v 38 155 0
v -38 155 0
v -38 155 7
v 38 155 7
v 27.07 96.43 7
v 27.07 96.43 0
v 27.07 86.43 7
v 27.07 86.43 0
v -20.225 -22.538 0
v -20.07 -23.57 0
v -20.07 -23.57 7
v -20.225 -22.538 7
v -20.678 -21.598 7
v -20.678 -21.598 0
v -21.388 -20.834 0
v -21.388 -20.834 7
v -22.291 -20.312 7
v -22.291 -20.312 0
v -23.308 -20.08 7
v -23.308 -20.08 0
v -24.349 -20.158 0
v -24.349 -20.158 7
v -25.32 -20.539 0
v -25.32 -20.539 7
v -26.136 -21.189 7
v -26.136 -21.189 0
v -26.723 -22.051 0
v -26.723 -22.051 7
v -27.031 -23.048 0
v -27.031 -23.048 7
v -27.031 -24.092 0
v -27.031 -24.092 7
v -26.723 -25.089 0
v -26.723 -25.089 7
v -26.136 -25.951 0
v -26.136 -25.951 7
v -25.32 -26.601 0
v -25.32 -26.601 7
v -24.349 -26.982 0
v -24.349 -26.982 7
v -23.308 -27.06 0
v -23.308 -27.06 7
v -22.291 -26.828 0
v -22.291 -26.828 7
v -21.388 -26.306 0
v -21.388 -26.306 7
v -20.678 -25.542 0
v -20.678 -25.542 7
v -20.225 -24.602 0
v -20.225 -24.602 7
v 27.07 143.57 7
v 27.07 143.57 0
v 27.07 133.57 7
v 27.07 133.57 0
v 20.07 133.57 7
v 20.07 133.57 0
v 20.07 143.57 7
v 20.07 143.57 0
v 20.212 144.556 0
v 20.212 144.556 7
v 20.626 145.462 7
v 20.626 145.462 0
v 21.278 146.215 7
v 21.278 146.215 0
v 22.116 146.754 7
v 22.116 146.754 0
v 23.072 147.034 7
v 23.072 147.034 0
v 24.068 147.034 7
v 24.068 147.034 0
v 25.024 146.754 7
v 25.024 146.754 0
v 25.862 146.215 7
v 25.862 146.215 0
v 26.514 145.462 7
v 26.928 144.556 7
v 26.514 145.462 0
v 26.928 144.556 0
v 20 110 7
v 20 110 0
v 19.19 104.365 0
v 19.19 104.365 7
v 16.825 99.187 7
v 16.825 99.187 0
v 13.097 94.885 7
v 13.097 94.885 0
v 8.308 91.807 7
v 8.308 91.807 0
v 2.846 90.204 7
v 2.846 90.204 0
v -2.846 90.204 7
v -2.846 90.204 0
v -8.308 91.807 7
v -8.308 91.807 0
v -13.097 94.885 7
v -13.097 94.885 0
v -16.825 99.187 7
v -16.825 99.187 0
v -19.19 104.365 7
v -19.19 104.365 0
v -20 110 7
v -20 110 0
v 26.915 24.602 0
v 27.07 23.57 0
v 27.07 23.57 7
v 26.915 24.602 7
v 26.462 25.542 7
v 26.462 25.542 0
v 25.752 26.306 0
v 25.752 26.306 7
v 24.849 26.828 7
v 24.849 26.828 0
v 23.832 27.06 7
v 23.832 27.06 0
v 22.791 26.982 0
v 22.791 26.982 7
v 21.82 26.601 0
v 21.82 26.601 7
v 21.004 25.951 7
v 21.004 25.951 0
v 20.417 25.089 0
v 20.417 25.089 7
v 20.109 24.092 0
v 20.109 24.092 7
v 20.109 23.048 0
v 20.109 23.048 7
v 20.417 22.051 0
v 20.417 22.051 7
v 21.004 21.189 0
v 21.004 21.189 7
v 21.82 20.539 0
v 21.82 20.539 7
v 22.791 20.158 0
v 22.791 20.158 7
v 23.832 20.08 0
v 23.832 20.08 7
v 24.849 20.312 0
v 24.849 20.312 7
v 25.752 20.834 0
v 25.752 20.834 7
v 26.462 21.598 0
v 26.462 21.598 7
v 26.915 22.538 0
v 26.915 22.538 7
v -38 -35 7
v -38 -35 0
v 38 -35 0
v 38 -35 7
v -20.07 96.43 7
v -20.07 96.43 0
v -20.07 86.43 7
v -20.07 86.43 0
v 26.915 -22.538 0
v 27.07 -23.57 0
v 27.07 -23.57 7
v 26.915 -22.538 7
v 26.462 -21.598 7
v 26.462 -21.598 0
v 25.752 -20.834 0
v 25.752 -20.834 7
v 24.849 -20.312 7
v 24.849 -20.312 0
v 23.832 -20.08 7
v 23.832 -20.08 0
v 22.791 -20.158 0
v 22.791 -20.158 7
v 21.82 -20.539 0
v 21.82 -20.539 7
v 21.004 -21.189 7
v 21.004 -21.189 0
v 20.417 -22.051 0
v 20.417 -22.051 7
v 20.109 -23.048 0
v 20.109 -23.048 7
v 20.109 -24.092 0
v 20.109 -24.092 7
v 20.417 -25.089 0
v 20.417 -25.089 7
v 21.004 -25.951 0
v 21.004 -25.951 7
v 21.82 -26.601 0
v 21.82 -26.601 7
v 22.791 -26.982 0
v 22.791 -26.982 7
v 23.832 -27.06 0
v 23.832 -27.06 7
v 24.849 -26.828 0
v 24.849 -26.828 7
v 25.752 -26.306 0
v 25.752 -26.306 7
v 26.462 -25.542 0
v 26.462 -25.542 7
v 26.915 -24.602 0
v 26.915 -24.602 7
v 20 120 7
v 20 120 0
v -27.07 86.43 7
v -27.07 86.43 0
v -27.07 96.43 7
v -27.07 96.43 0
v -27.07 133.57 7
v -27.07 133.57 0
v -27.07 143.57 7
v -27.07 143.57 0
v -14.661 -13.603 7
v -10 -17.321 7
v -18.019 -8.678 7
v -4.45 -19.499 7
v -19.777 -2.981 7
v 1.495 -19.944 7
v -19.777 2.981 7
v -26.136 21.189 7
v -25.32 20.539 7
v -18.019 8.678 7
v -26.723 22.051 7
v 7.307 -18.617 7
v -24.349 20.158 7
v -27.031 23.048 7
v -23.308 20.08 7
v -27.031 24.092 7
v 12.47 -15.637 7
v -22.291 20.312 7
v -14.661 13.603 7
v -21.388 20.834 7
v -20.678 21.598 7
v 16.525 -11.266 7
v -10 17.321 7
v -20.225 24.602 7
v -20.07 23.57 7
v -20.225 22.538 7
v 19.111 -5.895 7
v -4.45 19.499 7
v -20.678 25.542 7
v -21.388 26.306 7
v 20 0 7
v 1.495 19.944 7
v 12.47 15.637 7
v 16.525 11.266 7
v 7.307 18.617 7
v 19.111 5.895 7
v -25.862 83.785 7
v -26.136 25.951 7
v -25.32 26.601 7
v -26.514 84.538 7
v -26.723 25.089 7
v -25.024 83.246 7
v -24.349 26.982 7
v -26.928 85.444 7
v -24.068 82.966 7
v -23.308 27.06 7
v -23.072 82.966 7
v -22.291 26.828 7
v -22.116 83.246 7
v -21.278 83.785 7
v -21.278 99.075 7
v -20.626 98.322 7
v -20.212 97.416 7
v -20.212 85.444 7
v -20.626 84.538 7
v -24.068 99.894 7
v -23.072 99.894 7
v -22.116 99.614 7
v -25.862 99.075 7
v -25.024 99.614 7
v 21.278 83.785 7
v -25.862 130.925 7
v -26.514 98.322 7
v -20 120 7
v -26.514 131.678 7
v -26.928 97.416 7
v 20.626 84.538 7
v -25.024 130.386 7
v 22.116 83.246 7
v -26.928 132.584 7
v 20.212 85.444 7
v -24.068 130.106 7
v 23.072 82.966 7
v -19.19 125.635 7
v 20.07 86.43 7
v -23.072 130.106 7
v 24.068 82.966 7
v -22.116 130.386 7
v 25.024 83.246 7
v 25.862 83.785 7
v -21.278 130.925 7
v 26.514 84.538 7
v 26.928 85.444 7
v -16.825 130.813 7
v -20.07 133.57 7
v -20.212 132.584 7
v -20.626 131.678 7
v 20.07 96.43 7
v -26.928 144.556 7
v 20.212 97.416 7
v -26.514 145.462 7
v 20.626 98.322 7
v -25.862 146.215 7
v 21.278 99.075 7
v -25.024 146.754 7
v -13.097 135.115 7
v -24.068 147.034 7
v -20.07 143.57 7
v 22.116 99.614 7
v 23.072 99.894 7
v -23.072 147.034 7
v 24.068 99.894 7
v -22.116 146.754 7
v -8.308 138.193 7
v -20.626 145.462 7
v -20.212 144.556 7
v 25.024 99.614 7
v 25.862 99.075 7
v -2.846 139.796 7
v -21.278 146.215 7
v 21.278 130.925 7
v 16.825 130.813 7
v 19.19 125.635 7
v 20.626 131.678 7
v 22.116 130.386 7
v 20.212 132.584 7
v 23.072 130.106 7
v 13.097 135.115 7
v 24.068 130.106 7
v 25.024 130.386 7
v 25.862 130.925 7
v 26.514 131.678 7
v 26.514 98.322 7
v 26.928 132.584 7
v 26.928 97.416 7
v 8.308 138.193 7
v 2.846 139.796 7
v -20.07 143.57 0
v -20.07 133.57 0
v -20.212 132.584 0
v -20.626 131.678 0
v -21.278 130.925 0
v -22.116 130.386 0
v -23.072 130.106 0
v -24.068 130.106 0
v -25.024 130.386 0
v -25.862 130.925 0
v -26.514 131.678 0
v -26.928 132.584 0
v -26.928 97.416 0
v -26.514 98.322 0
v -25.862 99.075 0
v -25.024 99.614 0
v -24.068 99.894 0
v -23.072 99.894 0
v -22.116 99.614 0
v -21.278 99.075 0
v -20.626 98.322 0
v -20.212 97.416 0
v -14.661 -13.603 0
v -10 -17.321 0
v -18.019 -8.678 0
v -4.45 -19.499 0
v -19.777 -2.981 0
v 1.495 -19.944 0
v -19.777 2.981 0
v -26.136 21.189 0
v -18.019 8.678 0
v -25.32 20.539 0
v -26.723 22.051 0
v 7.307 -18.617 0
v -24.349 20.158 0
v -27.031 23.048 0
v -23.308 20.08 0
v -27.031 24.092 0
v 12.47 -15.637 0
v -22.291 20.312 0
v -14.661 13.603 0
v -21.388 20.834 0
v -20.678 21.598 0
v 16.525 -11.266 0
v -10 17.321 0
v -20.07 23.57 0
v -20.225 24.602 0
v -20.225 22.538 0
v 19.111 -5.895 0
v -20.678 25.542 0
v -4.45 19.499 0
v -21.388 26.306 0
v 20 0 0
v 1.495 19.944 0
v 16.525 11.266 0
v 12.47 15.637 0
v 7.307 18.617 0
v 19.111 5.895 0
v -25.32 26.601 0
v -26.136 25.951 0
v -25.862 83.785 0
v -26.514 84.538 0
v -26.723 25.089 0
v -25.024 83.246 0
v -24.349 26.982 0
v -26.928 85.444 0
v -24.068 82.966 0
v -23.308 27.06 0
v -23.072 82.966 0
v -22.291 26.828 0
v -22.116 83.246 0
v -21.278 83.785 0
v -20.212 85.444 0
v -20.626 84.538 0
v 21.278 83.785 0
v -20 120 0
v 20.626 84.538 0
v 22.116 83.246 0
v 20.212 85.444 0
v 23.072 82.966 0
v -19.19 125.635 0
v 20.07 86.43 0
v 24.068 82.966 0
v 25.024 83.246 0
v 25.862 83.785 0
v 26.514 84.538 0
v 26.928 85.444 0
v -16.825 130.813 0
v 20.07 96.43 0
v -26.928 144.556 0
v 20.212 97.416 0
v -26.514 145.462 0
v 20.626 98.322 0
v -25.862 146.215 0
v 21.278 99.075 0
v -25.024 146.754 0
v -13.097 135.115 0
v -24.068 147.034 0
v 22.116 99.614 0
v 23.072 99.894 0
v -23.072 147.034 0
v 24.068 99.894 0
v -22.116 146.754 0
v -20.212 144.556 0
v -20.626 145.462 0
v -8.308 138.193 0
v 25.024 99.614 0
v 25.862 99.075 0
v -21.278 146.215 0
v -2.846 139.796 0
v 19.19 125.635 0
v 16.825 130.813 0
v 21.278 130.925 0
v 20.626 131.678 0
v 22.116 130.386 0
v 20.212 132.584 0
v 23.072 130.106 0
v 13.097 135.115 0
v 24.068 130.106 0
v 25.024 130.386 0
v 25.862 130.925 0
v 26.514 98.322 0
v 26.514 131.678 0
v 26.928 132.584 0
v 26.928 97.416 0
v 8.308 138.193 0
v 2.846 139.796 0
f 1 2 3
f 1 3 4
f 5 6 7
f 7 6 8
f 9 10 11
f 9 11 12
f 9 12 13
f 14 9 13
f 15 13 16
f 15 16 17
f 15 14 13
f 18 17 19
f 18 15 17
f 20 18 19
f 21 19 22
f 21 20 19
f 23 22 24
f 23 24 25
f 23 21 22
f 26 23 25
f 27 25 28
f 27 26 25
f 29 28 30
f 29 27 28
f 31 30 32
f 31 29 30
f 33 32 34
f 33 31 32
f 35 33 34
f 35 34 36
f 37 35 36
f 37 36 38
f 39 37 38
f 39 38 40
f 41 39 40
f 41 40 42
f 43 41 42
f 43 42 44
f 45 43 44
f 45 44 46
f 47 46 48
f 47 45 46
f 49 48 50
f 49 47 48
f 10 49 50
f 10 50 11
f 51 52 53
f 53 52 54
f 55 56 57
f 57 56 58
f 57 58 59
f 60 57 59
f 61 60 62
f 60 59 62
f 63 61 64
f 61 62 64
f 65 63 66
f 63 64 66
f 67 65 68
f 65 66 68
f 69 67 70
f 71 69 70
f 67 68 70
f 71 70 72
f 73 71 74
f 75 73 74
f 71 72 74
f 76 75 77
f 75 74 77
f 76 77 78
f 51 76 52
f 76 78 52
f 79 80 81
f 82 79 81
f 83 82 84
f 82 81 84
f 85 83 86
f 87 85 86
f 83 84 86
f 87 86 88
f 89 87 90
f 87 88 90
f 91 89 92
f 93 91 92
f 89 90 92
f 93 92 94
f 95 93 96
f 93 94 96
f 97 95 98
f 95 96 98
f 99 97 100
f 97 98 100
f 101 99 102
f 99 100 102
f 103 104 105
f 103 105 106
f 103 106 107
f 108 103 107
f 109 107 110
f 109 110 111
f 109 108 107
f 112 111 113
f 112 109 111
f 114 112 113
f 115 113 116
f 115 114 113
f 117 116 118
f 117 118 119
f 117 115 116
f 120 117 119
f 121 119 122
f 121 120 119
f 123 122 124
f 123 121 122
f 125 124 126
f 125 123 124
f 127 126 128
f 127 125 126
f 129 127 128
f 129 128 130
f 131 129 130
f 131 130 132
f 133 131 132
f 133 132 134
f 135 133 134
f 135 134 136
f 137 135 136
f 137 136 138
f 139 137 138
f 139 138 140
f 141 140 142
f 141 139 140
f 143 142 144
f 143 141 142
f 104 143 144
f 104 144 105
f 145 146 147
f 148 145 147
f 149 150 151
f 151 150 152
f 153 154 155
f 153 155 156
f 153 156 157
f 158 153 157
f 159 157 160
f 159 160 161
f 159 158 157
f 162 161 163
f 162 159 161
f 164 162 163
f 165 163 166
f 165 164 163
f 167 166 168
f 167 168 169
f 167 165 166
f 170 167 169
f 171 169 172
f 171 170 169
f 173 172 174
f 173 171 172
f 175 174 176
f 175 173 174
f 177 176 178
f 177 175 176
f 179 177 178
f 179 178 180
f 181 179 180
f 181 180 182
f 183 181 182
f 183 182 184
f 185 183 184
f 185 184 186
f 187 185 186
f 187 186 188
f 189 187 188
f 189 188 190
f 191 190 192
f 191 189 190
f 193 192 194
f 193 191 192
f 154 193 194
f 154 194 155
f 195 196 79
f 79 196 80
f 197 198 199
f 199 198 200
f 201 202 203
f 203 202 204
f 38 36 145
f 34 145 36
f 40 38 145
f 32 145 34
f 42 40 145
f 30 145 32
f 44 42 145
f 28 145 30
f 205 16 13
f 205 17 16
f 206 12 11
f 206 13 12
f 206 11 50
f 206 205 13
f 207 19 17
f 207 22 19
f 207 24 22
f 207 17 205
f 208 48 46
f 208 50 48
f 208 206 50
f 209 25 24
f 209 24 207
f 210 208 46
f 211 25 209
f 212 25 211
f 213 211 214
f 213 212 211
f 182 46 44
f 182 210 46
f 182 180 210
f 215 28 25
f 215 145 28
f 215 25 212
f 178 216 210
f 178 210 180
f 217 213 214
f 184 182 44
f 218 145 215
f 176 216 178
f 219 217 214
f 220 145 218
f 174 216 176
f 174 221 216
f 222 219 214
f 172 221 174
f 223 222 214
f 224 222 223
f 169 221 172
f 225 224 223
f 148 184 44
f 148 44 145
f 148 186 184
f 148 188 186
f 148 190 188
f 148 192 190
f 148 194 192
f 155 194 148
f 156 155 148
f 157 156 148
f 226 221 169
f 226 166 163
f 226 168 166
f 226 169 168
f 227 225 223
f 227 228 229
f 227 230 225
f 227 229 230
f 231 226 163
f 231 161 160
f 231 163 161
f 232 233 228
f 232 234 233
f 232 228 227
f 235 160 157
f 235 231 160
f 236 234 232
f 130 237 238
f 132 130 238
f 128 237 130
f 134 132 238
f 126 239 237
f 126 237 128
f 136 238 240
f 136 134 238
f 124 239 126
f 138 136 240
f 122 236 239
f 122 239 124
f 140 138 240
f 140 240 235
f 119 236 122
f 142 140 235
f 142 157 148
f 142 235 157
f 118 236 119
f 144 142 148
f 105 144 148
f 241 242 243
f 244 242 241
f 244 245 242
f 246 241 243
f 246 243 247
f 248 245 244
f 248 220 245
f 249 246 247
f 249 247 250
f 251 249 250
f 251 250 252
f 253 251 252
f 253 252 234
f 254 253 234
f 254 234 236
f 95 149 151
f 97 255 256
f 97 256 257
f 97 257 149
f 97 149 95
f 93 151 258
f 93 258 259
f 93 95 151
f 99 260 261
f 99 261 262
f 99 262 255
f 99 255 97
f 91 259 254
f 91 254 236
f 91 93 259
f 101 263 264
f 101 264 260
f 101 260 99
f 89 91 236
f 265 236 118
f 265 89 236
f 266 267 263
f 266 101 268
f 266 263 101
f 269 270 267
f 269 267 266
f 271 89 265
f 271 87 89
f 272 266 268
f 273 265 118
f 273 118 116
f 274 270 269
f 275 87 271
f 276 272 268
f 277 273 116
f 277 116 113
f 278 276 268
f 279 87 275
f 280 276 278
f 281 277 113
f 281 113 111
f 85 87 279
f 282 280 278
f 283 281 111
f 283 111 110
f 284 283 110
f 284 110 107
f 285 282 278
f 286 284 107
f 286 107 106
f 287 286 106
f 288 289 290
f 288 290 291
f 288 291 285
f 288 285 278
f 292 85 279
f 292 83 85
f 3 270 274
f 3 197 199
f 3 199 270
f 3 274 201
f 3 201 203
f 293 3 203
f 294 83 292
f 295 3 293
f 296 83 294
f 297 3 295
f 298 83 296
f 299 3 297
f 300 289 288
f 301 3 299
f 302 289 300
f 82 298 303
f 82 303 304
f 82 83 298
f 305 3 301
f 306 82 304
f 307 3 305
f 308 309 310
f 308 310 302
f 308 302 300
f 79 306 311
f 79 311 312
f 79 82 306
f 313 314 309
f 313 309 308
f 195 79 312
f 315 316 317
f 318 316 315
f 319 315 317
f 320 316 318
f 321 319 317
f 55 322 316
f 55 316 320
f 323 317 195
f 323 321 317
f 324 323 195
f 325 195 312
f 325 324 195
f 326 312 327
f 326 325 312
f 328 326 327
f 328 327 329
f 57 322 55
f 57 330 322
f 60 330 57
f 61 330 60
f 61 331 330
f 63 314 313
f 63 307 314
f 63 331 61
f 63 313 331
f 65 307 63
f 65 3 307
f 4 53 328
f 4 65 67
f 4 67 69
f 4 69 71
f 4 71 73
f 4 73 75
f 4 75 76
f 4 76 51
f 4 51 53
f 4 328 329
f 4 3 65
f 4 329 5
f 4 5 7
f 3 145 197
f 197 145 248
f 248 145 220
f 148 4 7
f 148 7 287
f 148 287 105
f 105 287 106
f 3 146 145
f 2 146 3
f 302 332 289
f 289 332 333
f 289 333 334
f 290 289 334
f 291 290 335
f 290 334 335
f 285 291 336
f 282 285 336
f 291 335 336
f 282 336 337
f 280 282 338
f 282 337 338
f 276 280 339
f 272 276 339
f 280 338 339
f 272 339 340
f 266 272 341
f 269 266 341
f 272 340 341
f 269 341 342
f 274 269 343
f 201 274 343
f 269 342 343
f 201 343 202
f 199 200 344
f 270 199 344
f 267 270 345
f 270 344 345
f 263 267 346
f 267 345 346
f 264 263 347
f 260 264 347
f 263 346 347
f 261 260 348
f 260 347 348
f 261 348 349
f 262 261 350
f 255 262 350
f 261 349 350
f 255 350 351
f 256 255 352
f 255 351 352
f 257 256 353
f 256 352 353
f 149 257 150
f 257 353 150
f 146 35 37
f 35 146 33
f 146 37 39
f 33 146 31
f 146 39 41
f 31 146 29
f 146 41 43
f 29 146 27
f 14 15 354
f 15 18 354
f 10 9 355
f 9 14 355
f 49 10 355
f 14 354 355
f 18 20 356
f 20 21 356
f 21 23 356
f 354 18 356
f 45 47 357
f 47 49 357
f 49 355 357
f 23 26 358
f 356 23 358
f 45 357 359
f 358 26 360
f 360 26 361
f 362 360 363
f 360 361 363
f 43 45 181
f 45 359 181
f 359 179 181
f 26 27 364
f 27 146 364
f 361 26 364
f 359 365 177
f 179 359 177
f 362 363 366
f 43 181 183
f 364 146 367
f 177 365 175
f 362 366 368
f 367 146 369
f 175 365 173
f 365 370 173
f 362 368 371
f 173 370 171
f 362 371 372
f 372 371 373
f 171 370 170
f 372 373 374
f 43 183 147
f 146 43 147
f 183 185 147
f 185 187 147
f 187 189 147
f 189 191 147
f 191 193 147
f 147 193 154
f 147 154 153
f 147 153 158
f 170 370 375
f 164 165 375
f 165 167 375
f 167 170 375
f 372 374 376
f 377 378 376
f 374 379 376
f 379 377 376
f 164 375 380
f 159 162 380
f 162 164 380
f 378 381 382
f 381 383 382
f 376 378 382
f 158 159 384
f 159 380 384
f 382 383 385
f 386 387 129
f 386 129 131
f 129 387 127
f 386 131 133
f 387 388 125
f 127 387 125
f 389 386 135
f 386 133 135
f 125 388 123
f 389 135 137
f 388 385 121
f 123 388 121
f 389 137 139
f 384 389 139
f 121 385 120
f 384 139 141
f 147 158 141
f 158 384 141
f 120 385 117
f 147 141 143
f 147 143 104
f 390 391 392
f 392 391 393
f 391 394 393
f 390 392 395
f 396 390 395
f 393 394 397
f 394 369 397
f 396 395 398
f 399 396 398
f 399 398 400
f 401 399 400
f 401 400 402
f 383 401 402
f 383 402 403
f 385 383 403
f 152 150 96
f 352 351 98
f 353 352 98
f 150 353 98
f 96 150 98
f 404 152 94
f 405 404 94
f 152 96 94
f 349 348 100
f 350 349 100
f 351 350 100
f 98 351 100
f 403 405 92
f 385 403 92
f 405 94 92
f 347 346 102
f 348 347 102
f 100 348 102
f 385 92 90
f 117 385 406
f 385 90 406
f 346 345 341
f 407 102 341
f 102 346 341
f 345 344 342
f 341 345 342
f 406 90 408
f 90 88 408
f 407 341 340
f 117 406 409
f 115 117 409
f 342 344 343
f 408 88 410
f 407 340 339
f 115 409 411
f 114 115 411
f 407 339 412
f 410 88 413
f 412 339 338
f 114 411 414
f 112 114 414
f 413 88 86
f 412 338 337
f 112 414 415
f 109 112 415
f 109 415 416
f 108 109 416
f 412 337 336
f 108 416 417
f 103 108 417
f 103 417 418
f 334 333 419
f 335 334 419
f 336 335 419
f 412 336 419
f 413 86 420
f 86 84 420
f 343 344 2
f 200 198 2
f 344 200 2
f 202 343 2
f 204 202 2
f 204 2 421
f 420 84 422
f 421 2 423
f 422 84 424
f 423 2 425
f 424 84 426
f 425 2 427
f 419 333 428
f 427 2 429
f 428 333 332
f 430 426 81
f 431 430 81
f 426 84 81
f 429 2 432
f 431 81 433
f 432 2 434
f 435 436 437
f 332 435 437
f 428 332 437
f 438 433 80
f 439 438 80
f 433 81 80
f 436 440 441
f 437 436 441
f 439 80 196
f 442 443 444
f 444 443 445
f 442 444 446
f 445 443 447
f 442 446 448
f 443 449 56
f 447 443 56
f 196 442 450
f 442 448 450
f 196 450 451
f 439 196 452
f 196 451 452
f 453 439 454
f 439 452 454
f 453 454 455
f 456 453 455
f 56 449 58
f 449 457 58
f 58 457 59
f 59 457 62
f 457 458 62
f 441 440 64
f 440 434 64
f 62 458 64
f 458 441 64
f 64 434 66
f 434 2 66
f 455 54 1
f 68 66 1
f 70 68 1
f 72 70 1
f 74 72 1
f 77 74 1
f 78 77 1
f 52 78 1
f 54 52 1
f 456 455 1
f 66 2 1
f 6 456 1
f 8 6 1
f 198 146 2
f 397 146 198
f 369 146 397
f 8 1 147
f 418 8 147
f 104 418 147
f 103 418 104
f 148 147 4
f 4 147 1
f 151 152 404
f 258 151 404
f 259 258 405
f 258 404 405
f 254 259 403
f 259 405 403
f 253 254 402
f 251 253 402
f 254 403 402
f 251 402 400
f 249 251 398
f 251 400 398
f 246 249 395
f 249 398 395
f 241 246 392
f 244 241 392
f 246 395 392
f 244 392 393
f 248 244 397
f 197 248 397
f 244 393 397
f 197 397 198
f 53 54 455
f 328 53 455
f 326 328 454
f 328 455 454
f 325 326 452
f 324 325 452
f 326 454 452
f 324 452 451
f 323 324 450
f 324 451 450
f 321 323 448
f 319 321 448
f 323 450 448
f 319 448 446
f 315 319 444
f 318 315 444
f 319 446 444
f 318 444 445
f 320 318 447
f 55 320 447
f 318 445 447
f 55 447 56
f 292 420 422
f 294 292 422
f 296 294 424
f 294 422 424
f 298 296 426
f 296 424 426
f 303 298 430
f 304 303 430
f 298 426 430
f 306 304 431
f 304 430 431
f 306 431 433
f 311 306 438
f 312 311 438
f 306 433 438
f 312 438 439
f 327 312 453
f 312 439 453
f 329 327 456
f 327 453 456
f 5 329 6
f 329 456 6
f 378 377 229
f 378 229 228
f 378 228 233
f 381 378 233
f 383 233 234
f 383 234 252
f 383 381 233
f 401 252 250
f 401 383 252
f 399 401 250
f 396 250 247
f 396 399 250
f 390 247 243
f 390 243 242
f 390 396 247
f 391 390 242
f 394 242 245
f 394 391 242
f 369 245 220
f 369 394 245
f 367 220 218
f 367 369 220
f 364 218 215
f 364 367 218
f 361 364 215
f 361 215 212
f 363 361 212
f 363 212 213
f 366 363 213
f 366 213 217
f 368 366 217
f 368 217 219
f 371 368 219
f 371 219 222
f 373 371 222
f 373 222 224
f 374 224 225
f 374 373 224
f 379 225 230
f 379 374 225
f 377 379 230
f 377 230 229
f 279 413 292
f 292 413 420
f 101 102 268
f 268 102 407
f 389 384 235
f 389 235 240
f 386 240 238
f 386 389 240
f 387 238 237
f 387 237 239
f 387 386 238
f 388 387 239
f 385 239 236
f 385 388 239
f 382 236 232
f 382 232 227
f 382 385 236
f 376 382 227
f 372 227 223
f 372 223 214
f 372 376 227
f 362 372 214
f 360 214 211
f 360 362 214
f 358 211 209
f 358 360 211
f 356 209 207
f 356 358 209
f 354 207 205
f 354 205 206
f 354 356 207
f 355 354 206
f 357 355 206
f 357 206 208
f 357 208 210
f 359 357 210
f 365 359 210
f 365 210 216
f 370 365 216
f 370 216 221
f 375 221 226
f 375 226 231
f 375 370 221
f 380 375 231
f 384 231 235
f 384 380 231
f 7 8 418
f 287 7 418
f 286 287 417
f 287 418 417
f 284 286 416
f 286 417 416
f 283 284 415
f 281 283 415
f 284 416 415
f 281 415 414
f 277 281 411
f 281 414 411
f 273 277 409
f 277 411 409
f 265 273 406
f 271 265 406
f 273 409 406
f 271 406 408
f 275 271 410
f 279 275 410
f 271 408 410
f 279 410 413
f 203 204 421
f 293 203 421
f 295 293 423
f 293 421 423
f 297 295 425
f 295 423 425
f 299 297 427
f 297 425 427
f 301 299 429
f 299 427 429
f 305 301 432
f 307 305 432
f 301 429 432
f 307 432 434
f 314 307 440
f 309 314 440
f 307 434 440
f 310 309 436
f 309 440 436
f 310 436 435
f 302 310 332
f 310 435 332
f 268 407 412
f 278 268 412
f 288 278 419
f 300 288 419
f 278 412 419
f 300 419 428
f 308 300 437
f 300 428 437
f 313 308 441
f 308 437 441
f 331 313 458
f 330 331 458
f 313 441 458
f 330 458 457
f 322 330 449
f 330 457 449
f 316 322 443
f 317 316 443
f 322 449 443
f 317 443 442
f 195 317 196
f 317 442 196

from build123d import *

# Parameters (mm, degrees)
F0_W     = 76
F0_H     = 190
F0_R     = 3.5
F0_R_2   = 20
F1_DEPTH = 7


# Not quite as in the source:
# - a feature names something its author has since deleted; it is built from what else it names


with BuildPart() as f1:
    # F0 (on Top) → F1 (new body)
    with BuildSketch(Plane.XY):
        with Locations((0, 60)):
            Rectangle(F0_W, F0_H)
        with Locations((-23.57, -23.57)):
            Circle(F0_R, mode=Mode.SUBTRACT)
        with Locations((-23.57, 23.57)):
            Circle(F0_R, mode=Mode.SUBTRACT)
        Circle(F0_R_2, mode=Mode.SUBTRACT)
        with Locations((23.57, -23.57)):
            Circle(F0_R, mode=Mode.SUBTRACT)
        with Locations((23.57, 23.57)):
            Circle(F0_R, mode=Mode.SUBTRACT)
        with BuildLine():
            Line((-27.07, 86.43), (-27.07, 96.43))
            ThreePointArc((-27.07, 96.43), (-23.5699996641, 99.93), (-20.07, 96.4299993282))
            Line((-20.07, 96.4299993282), (-20.07, 86.4299993282))
            ThreePointArc((-20.07, 86.4299993282), (-23.5700003359, 82.93), (-27.07, 86.43))
        make_face(mode=Mode.SUBTRACT)
        with BuildLine():
            Line((-27.07, 133.57), (-27.07, 143.57))
            ThreePointArc((-27.07, 143.57), (-23.5699996641, 147.07), (-20.07, 143.5699993282))
            Line((-20.07, 143.5699993282), (-20.07, 133.5699993282))
            ThreePointArc((-20.07, 133.5699993282), (-23.5700003359, 130.07), (-27.07, 133.57))
        make_face(mode=Mode.SUBTRACT)
        with BuildLine():
            Line((20.07, 86.43), (20.07, 96.43))
            ThreePointArc((20.07, 96.43), (23.5700003359, 99.93), (27.07, 96.4299993282))
            Line((27.07, 96.4299993282), (27.07, 86.4299993282))
            ThreePointArc((27.07, 86.4299993282), (23.5699996641, 82.93), (20.07, 86.43))
        make_face(mode=Mode.SUBTRACT)
        with BuildLine():
            Line((-20, 110), (-20, 120))
            ThreePointArc((-20, 120), (1.2657e-06, 140), (20, 119.9999974687))
            Line((20, 119.9999974687), (20, 109.9999974687))
            ThreePointArc((20, 109.9999974687), (-1.2657e-06, 90), (-20, 110))
        make_face(mode=Mode.SUBTRACT)
        with BuildLine():
            Line((20.07, 133.57), (20.07, 143.57))
            ThreePointArc((20.07, 143.57), (23.5700003359, 147.07), (27.07, 143.5699993282))
            Line((27.07, 143.5699993282), (27.07, 133.5699993282))
            ThreePointArc((27.07, 133.5699993282), (23.5699996641, 130.07), (20.07, 133.57))
        make_face(mode=Mode.SUBTRACT)
    extrude(amount=F1_DEPTH)


solid = f1.part
